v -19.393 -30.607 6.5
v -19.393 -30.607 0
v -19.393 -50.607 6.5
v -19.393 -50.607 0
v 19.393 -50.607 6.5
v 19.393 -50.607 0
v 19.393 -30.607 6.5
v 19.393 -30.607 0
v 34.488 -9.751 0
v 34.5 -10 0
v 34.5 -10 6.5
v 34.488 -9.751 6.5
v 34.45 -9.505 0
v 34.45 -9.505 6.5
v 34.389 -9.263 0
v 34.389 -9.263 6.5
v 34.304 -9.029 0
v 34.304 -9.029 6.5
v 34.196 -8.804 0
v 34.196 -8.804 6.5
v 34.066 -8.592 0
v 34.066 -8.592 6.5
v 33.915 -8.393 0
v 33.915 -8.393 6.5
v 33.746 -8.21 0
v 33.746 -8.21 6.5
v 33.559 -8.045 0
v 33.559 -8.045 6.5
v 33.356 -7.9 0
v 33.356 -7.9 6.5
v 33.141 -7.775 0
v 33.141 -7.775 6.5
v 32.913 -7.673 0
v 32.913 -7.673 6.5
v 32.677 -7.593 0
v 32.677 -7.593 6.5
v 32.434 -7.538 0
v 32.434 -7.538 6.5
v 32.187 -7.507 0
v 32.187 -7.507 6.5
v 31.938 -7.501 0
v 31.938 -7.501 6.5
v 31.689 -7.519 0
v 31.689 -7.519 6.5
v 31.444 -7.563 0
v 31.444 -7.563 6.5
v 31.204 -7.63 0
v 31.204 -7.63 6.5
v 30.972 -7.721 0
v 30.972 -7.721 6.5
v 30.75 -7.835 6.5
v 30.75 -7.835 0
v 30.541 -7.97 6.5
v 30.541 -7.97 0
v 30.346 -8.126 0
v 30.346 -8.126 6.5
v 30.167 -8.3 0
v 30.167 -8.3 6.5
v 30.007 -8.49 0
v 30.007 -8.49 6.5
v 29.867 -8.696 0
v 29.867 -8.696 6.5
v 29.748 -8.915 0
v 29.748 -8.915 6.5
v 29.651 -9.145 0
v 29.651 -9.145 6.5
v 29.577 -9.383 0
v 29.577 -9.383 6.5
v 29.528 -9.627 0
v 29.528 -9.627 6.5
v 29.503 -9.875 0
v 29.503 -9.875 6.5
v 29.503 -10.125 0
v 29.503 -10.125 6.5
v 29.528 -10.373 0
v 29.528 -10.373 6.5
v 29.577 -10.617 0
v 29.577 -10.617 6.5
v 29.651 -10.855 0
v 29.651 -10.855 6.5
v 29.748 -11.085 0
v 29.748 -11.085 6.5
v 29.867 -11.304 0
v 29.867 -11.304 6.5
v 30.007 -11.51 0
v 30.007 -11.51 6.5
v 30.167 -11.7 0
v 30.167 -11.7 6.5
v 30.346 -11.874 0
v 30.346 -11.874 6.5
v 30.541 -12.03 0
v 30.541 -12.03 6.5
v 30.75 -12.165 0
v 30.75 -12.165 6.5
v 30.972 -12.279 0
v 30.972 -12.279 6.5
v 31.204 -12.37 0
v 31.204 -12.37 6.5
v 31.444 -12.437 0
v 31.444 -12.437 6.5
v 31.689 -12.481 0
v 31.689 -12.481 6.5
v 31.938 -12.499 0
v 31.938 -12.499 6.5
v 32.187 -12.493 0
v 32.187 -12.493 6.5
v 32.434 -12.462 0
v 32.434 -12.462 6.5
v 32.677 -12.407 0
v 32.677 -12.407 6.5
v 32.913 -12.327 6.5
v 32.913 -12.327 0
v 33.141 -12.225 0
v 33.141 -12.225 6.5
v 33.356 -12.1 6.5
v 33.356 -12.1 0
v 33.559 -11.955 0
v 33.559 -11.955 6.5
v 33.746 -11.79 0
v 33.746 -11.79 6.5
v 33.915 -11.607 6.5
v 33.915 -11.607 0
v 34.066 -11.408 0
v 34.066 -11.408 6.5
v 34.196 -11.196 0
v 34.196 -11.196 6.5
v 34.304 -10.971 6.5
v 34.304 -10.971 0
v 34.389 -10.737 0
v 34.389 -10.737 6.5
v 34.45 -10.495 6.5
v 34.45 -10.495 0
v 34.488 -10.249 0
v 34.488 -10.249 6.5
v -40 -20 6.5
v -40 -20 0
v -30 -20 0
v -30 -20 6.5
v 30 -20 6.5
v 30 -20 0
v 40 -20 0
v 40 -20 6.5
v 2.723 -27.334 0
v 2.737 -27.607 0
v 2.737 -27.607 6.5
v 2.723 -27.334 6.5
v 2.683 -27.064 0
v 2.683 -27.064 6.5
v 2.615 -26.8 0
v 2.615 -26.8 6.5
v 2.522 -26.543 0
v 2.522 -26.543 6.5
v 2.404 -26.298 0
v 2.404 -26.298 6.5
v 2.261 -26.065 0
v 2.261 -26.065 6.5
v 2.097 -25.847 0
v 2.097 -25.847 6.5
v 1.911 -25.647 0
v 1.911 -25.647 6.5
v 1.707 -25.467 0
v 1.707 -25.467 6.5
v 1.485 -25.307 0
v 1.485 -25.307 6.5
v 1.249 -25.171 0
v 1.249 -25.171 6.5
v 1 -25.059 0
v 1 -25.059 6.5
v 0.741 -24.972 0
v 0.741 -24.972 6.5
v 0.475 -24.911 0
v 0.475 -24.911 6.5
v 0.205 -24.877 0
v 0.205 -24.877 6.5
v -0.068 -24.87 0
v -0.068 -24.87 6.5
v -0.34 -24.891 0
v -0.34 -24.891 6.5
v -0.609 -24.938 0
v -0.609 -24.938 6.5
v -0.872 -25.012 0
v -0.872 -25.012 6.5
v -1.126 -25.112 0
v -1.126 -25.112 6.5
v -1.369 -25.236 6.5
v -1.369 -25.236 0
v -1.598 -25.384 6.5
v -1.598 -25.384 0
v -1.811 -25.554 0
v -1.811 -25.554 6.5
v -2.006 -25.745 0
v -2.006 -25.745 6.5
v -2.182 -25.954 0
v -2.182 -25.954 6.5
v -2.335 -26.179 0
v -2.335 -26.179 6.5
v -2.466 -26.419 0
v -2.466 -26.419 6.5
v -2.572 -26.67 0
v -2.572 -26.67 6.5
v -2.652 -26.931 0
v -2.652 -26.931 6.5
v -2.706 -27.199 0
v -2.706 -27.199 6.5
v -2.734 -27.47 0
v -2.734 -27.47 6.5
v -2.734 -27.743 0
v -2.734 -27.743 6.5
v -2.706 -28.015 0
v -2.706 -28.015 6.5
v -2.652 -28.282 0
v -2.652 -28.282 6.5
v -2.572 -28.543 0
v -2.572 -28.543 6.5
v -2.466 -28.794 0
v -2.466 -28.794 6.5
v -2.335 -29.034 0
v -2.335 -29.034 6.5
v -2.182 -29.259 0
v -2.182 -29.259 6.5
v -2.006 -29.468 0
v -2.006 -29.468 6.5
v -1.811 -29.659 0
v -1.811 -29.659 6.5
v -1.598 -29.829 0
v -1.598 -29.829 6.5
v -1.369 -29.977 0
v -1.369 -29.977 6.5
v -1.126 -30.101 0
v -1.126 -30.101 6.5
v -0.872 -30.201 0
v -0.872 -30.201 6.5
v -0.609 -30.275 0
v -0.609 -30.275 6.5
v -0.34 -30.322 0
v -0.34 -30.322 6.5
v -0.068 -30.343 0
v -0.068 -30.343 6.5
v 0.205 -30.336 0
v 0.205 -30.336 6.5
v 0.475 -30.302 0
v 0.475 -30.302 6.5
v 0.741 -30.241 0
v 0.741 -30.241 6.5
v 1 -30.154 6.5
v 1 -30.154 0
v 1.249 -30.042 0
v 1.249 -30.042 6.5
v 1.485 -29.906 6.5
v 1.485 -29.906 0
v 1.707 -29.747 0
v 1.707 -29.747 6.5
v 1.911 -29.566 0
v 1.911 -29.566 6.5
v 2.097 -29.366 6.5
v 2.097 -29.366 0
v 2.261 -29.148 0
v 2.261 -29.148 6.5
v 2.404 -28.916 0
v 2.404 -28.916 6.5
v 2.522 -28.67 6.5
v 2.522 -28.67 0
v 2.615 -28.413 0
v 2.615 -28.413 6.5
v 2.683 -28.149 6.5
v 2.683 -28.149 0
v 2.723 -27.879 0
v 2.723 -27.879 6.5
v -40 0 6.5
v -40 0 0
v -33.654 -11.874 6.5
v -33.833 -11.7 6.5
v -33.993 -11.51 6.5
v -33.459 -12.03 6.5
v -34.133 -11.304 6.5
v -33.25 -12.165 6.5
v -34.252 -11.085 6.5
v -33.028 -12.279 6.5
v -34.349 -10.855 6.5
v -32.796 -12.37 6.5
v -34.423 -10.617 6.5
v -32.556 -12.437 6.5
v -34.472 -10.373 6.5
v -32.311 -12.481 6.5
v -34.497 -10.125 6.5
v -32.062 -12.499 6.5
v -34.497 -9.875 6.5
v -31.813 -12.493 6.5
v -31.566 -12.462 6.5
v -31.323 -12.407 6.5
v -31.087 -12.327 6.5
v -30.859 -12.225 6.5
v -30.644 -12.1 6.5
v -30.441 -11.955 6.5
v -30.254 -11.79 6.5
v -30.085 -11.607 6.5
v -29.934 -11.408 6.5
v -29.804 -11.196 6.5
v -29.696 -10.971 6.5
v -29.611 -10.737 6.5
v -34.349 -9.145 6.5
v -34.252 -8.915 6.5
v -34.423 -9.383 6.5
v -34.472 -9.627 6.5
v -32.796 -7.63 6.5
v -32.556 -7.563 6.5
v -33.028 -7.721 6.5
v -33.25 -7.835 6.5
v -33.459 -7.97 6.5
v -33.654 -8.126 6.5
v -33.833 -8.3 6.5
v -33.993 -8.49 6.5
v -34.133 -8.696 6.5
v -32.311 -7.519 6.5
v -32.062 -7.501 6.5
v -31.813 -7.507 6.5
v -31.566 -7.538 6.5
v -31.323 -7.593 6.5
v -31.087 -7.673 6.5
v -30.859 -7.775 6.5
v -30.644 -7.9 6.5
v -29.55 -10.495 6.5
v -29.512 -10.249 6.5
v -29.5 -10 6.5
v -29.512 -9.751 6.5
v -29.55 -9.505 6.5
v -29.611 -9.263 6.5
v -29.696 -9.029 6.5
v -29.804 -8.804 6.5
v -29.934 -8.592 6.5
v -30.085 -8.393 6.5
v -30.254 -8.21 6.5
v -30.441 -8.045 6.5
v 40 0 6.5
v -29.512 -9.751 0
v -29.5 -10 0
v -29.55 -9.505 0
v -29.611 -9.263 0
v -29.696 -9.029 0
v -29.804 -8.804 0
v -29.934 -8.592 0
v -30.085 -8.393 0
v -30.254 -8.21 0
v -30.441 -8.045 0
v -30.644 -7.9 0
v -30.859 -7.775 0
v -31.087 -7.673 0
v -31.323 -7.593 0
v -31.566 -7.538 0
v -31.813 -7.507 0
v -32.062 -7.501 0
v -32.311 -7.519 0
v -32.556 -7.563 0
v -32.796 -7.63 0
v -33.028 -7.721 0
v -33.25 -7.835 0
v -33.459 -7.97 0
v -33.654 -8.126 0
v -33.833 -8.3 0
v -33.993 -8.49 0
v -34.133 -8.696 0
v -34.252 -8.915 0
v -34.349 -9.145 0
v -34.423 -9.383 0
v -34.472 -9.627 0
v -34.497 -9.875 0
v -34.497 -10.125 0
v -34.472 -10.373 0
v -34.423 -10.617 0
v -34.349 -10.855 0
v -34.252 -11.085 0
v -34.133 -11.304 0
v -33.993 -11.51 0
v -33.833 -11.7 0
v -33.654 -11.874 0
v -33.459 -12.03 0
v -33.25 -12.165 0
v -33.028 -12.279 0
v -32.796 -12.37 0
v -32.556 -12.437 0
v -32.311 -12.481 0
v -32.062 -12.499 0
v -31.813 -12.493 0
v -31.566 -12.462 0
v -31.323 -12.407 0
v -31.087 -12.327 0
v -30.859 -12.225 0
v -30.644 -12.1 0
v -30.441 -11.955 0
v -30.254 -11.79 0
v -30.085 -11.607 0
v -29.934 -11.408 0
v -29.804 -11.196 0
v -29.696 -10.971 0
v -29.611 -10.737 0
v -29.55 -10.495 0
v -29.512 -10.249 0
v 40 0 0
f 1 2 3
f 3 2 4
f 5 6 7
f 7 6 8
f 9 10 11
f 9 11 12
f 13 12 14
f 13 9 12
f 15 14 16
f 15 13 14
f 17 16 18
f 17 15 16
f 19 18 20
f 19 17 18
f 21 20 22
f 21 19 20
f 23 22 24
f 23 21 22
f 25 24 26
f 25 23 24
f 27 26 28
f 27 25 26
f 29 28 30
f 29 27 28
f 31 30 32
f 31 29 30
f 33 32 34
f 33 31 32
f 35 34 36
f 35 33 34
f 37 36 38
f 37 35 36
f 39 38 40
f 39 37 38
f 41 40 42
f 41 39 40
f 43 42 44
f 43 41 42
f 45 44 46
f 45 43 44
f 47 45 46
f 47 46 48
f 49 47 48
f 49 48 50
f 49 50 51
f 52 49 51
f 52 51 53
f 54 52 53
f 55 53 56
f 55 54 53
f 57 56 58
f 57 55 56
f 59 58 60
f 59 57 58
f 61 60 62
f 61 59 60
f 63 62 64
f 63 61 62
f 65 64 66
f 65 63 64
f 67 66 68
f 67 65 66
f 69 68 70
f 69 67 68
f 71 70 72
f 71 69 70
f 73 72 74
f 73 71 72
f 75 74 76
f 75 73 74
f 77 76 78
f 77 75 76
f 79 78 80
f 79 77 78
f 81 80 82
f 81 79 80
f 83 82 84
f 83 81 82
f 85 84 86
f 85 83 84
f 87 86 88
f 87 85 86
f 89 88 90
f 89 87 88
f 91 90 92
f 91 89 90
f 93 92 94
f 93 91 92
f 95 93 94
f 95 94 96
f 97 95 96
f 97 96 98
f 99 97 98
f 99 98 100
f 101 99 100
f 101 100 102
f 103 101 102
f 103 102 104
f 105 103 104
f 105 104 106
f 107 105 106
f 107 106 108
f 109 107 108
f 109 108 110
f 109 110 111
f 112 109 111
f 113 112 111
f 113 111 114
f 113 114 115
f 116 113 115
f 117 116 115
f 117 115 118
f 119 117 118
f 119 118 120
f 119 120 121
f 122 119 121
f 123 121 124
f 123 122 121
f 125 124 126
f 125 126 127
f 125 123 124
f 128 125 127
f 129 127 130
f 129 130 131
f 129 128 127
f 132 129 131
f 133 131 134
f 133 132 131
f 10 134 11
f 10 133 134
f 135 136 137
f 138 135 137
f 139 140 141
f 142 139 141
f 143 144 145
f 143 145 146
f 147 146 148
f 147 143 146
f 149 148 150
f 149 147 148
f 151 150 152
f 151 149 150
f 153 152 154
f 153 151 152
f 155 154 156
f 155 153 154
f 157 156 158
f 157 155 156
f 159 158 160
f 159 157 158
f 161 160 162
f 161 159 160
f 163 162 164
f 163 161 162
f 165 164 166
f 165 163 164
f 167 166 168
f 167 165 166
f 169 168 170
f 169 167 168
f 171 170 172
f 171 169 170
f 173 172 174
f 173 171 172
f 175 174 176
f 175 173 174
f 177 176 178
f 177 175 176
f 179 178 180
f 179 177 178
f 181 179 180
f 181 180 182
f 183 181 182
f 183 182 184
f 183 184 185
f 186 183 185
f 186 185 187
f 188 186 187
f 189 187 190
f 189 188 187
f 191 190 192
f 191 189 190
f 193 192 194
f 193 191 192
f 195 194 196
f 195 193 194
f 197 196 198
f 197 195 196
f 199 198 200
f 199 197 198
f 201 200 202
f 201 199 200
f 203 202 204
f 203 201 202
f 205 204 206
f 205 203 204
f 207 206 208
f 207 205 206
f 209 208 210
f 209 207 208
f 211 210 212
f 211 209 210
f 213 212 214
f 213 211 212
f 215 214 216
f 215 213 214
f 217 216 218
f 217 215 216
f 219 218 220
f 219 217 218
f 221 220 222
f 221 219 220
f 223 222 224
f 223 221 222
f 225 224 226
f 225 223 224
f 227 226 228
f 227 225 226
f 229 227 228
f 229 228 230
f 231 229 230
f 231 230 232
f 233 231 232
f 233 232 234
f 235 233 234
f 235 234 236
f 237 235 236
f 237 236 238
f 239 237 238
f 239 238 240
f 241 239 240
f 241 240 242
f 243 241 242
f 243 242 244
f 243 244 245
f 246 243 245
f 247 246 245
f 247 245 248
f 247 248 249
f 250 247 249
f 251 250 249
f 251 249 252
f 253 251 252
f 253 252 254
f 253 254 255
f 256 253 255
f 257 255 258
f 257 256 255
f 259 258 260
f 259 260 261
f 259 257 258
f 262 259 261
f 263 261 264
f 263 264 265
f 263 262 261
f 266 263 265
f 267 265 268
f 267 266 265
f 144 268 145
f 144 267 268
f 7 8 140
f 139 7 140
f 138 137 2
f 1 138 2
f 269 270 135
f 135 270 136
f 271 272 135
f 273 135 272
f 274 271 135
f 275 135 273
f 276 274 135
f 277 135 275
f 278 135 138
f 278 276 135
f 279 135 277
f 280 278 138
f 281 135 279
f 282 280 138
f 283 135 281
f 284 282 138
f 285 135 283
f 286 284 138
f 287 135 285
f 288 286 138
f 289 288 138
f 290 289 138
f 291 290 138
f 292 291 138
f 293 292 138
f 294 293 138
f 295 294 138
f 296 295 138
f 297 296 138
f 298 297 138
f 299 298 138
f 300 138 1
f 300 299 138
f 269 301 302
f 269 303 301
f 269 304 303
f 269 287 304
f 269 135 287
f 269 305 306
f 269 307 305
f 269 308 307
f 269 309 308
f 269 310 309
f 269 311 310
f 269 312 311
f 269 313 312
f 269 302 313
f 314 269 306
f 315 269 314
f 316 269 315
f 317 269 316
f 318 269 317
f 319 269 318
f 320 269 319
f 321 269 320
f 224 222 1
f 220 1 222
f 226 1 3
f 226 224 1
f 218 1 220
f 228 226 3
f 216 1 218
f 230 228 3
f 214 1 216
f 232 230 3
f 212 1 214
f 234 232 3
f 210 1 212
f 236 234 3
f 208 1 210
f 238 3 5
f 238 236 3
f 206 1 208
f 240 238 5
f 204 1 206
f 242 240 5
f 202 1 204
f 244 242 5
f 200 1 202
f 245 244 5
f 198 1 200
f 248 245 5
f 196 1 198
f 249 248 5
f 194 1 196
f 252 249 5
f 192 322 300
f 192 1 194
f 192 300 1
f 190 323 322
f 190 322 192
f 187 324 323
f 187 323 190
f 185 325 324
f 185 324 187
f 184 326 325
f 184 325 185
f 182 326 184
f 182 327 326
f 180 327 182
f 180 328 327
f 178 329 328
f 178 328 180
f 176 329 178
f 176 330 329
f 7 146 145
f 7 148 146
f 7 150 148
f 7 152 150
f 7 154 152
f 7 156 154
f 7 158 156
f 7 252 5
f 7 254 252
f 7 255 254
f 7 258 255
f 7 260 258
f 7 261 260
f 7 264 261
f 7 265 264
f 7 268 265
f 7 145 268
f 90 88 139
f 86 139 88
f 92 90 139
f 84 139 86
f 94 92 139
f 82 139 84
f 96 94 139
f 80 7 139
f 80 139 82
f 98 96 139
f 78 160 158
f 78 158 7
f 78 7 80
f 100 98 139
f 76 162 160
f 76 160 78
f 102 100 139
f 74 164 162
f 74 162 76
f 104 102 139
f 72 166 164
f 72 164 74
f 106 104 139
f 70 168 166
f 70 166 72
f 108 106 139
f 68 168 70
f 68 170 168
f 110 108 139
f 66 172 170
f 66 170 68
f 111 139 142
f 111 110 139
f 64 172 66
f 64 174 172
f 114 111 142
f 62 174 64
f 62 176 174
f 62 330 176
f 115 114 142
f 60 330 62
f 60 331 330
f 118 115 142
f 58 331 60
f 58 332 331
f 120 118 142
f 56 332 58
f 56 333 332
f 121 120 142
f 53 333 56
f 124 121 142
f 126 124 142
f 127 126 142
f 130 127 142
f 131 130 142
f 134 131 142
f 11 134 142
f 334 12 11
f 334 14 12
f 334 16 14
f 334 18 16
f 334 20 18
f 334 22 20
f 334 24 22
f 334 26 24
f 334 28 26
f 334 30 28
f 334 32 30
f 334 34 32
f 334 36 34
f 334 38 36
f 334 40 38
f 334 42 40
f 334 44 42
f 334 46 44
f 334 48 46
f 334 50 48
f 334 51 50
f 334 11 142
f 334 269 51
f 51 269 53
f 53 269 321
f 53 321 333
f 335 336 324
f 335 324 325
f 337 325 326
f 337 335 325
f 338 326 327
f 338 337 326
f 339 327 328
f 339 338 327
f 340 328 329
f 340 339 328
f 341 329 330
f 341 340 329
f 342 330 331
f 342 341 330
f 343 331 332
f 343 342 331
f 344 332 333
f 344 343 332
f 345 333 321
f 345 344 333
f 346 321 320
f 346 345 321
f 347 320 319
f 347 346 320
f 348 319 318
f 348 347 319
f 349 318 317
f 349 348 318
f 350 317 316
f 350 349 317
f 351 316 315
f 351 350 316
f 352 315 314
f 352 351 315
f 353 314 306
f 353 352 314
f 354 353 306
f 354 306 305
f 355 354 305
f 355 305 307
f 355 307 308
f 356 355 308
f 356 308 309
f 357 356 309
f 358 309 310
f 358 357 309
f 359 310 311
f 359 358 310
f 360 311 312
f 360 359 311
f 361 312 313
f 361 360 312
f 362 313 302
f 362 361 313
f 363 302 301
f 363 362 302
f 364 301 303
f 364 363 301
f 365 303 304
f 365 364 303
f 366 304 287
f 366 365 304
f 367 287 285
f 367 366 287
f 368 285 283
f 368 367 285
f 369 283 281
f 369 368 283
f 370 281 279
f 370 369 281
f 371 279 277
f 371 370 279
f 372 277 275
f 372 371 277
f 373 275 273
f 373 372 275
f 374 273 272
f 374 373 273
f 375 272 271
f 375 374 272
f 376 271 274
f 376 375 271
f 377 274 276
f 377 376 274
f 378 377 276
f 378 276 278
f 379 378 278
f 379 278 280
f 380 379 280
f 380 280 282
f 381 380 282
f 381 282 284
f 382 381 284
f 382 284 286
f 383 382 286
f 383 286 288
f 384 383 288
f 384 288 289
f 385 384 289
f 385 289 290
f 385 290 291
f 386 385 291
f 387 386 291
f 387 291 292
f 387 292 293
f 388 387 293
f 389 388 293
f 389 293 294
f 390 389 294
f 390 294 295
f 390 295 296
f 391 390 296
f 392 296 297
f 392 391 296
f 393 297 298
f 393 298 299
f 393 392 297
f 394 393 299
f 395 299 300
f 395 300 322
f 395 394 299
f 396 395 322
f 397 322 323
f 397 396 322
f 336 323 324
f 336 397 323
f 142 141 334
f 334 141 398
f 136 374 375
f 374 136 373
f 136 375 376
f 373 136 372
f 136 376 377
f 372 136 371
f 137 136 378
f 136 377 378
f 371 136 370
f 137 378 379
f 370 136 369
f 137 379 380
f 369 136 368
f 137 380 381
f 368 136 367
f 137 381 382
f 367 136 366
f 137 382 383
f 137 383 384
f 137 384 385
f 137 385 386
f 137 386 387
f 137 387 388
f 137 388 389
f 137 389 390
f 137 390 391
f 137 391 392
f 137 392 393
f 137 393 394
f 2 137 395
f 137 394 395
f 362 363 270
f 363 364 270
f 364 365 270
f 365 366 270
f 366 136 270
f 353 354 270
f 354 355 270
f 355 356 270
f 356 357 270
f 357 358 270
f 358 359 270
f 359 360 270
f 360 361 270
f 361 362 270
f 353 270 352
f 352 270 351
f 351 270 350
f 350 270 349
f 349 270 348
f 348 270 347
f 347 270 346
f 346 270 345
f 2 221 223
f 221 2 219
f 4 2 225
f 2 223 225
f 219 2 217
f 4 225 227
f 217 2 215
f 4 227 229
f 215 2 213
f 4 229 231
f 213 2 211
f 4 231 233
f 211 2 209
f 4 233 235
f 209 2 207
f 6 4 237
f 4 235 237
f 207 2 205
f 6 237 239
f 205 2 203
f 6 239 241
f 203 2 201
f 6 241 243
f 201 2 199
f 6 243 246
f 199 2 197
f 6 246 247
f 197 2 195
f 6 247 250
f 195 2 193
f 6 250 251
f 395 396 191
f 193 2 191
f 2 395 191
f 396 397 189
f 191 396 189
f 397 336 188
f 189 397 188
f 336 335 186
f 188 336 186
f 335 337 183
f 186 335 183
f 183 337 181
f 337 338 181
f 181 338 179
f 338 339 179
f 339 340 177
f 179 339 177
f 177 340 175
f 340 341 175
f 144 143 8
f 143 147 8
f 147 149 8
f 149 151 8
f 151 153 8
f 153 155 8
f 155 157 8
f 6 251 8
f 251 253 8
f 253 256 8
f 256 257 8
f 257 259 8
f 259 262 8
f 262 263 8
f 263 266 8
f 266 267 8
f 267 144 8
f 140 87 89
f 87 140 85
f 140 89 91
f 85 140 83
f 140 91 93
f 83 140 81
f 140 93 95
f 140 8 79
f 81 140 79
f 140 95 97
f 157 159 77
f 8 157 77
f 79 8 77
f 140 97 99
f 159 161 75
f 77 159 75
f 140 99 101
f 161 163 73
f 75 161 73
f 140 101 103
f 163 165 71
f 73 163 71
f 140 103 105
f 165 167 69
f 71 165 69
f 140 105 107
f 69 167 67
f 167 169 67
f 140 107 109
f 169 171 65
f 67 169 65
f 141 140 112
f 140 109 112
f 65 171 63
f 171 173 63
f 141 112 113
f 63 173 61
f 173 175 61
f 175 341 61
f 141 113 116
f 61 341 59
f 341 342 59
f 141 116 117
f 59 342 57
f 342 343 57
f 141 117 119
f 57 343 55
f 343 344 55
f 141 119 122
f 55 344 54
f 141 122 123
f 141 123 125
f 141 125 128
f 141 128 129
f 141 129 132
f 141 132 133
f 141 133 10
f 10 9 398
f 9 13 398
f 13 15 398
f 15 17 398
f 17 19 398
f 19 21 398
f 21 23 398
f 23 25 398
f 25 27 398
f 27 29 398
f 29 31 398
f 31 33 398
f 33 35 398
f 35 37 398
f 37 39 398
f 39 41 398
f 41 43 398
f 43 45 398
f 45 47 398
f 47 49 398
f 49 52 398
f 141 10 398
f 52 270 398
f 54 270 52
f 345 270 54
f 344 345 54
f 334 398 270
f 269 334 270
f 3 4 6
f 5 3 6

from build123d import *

# Parameters (mm, degrees)
F0_R     = 2.737036
F0_R_2   = 2.5
F1_DEPTH = 6.5


with BuildPart() as f1:
    # F0 (on Top) → F1 (new body)
    with BuildSketch(Plane.XY):
        Polygon((40, 0), (-40, 0), (-40, -20), (-30, -20), (-19.393398, -30.606602), (-19.393398, -50.606602), (19.393398, -50.606602), (19.393398, -30.606602), (30, -20), (40, -20), align=None)
        with Locations((0, -27.606602)):
            Circle(F0_R, mode=Mode.SUBTRACT)
        with Locations((-32, -10)):
            Circle(F0_R_2, mode=Mode.SUBTRACT)
        with Locations((32, -10)):
            Circle(F0_R_2, mode=Mode.SUBTRACT)
    extrude(amount=F1_DEPTH)


solid = f1.part
